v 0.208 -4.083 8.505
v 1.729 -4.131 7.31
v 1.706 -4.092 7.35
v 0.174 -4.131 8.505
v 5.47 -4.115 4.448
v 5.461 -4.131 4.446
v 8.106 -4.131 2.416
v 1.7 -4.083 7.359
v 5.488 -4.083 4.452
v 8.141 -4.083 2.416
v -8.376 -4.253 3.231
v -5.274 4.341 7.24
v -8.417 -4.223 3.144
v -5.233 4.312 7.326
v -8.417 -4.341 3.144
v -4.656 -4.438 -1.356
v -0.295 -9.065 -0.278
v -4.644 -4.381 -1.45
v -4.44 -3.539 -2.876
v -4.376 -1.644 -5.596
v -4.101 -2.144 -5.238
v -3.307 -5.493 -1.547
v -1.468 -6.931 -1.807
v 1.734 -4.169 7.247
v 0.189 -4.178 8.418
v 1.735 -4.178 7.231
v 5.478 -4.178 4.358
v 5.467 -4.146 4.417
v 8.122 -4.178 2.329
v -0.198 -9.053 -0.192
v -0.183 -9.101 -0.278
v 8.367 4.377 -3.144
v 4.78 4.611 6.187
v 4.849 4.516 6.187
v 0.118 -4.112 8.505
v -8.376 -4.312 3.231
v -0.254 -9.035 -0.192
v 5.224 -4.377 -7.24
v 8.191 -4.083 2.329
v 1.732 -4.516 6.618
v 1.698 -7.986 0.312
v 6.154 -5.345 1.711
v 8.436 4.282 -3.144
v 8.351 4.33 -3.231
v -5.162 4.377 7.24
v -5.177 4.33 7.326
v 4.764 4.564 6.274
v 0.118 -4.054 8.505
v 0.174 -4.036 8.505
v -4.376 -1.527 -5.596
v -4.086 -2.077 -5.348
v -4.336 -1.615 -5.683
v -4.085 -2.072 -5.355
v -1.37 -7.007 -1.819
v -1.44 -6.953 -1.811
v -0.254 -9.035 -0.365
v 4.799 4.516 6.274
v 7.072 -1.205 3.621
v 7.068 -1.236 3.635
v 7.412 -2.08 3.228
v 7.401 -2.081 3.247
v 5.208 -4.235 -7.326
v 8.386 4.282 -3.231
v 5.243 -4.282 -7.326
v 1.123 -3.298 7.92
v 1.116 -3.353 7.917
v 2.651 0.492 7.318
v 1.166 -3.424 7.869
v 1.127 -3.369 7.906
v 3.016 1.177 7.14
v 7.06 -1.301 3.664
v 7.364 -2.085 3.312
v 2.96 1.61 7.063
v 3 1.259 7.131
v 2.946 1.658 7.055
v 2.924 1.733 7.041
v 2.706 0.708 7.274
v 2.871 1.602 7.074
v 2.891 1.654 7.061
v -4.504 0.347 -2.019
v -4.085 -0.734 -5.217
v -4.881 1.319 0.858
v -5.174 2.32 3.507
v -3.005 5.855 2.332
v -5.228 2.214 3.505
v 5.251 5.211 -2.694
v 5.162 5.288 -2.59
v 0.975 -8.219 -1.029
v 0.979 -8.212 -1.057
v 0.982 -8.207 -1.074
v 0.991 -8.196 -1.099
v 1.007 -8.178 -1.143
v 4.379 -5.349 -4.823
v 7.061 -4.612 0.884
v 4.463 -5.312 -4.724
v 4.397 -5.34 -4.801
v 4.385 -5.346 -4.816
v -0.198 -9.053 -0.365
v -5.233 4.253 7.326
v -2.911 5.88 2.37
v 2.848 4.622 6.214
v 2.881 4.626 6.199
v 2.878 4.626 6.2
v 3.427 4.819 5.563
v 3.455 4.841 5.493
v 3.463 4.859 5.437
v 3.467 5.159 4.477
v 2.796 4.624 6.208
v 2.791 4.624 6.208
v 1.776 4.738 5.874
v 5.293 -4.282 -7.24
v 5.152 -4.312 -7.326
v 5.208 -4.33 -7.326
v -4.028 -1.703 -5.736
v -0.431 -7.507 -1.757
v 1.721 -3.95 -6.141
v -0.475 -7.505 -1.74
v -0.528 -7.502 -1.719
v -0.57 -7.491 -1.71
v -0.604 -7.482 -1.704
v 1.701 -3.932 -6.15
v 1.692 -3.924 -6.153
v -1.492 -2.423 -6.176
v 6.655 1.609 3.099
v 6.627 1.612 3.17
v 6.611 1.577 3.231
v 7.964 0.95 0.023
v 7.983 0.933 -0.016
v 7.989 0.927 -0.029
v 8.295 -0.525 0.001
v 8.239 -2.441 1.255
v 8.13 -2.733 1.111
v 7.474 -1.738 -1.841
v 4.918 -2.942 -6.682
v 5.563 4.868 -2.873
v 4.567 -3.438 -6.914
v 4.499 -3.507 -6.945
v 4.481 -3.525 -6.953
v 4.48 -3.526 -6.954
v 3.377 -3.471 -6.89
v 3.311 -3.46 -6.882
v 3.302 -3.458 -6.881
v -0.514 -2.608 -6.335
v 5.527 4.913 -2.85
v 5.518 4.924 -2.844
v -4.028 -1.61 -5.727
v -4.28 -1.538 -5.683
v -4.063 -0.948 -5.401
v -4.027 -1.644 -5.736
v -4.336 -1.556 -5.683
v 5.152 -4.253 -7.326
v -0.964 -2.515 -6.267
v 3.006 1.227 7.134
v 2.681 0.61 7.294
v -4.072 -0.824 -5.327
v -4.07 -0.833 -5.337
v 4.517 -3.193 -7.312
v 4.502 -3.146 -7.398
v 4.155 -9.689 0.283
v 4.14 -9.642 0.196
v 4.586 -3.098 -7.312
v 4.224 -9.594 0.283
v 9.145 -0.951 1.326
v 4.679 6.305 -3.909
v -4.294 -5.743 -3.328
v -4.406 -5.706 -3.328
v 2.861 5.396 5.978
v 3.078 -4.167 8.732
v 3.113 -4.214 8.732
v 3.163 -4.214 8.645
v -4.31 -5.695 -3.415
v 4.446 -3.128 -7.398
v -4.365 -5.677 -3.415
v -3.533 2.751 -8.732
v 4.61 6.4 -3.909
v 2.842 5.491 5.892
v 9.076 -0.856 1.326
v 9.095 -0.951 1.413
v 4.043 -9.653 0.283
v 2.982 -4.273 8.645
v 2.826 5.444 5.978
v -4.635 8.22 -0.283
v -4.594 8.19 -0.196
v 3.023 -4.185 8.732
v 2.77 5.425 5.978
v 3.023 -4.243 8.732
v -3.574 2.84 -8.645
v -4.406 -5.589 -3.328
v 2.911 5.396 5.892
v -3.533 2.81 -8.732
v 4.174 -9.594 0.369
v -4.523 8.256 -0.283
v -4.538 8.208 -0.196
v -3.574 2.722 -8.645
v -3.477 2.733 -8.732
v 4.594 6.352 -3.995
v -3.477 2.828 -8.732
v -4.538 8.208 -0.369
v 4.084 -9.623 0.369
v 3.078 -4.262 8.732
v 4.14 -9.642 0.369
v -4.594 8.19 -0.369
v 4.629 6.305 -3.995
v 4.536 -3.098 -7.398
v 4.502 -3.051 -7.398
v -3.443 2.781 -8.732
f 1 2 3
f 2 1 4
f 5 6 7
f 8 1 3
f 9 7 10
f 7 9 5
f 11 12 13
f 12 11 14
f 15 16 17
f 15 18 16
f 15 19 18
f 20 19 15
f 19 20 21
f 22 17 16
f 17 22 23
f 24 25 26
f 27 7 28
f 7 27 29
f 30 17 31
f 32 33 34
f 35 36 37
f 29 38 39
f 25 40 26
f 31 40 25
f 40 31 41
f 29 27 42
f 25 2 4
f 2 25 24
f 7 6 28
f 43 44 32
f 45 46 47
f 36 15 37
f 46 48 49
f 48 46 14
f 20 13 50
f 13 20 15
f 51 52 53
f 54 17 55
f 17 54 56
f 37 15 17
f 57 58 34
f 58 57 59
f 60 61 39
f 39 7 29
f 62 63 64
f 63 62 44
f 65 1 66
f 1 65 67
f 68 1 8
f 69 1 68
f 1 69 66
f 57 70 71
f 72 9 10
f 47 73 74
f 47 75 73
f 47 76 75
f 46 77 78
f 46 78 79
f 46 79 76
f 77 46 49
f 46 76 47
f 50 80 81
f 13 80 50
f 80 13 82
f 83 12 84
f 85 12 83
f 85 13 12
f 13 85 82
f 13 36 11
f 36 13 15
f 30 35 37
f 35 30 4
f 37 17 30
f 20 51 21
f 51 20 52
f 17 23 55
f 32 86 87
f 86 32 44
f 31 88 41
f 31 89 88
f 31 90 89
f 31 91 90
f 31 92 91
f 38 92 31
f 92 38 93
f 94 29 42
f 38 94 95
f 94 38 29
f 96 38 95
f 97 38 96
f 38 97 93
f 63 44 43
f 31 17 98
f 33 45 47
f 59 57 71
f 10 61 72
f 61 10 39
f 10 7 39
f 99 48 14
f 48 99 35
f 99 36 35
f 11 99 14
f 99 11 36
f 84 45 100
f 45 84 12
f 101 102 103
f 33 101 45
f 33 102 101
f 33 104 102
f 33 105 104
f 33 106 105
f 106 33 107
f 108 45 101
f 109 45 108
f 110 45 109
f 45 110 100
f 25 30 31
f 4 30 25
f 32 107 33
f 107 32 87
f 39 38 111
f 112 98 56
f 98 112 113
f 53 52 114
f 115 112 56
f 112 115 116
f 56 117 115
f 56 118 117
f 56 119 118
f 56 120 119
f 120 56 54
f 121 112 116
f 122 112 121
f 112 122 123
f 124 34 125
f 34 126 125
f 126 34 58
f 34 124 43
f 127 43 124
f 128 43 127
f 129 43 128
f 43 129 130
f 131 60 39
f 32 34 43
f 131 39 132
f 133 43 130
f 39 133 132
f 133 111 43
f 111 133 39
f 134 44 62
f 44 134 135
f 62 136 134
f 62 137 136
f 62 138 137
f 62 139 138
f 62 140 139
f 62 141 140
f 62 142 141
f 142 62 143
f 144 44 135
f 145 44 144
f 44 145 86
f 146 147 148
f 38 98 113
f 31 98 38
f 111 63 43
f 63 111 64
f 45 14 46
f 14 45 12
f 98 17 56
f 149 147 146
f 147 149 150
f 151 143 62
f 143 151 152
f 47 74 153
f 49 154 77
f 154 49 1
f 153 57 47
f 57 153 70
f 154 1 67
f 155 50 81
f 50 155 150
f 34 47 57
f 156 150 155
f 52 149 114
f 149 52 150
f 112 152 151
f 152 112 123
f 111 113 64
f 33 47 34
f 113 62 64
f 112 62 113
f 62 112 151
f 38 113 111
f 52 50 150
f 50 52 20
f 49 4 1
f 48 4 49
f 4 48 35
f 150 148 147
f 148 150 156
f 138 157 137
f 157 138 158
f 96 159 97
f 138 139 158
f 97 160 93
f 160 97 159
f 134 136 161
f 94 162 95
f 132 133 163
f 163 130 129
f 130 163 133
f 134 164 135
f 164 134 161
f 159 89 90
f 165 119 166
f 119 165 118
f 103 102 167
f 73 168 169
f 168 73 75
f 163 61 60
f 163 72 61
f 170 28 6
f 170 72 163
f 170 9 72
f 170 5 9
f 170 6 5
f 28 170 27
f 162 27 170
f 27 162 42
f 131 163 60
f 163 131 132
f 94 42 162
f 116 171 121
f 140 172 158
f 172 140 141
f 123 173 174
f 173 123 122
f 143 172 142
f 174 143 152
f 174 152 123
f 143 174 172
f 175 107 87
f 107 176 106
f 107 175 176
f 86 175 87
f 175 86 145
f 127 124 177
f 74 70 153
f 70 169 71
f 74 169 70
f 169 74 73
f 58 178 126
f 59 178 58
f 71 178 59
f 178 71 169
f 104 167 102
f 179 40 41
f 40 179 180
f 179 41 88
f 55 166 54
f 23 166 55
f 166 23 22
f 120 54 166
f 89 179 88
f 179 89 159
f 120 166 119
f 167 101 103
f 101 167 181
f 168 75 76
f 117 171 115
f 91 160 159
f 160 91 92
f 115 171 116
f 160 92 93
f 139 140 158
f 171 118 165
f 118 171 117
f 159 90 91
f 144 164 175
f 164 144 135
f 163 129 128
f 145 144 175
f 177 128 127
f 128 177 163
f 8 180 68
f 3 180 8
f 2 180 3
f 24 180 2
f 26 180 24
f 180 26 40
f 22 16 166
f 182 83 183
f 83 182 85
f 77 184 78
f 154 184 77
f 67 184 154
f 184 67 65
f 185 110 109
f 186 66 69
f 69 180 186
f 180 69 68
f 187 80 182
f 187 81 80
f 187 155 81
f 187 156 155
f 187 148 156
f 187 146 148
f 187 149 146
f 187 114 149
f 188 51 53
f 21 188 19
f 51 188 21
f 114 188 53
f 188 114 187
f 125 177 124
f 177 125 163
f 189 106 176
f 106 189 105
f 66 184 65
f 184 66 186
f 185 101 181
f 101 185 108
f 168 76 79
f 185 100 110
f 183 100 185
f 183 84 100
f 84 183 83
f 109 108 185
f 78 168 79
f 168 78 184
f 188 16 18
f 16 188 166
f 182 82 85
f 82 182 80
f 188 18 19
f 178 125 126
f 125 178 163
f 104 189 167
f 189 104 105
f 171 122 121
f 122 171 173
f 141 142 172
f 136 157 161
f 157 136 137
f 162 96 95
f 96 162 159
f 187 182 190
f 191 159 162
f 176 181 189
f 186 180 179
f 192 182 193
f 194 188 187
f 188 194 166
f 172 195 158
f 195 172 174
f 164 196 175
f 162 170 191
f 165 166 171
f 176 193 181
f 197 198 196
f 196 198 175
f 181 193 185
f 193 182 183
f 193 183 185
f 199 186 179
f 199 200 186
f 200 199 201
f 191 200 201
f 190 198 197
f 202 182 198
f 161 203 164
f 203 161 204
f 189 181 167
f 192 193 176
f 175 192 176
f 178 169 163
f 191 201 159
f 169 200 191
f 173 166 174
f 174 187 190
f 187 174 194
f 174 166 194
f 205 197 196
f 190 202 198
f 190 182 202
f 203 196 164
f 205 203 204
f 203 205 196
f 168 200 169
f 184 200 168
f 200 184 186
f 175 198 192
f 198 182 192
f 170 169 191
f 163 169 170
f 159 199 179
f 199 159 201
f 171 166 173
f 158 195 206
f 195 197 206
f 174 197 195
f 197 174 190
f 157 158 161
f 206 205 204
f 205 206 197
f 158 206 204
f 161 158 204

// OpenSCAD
// Auto-generated OpenSCAD file

    inner_points = 10*[[-0.4553770683985672, 0.816075390462194, -0.02826725120202972], [-0.3492651290097586, 0.27808264626453244, -0.8645112727111914], [0.3062996757811438, -0.4214091552352098, 0.8645112727111914], [0.4124116151699524, -0.9594018994328712, 0.02826725120202972], [0.45789115536956515, 0.630471121507822, -0.3908857929250278], [0.9045034915748815, -0.09513310390029023, 0.13259861870450954], [-0.5386073879474271, -0.026770981308893688, 0.5034118884114294], [-0.43249544855861854, -0.5647637255065552, -0.33283213309773235], [0.28106973038452526, 0.5396015179782265, 0.5891534403817997], [0.44860512332870417, -0.3098111524472321, -0.7311548260368412]];

    outer_points = 10*[[-0.8336003958246909, -0.4282242422434667, 0.3144481157395024], [-0.5192798779886039, 0.4282242422434667, 0.7239583176726031], [0.5192798779886039, -0.4282242422434667, -0.7239583176726031], [0.8336003958246909, 0.4282242422434667, -0.3144481157395024], [0.015816542021752034, -0.40830815643207485, 0.8417945059096876], [0.8090835339719289, -0.40830815643207485, 0.2329205620737586], [-0.42955329110383256, -0.15856661937867184, -0.559640382982223], [-0.11523277326774545, 0.6978818651082617, -0.15013018104912235], [-0.02137609852116739, -0.9005841684864844, -0.02784969457994478], [0.47489050229114943, 0.45162402044515604, 0.6187076390309791]];

    // Convex hull for inner set (I)
    module inner_hull() {
        hull() {
            for (p = inner_points) {
                translate(p) sphere(r=0.1);
            }
        }
    }

    // Convex hull for outer set (O) minus inner hull (O \ I)
    module outer_minus_inner() {
        difference() {
            hull() {
                for (p = outer_points) {
                    translate(p) sphere(r=0.1);
                }
            }
            inner_hull(); // Subtract inner hull
        }
    }

    // Convex hull for outer set (O) minus all translated inner hulls
    module outer_minus_AllTranslationInner() {
        difference() {
            hull() {
                for (p = outer_points) {
                    translate(p) sphere(r=0.1);
                }
            }
            hull() {
                translate([0,0,50]) inner_hull();
                translate([0,0,-50]) inner_hull();
            }; // Subtract translated inner hulls
        }
    }

    // Difference between outer_minus_inner and outer_minus_AllTranslationInner
    module outer_minus_inner_diff() {
        difference() {
            // Outer minus inner
            difference() {
                hull() {
                    for (p = outer_points) {
                        translate(p) sphere(r=0.1);
                    }
                }
                inner_hull();
            }

            // Subtract Outer minus AllTranslationInner
            difference() {
                hull() {
                    for (p = outer_points) {
                        translate(p) sphere(r=0.1);
                    }
                }
                hull() {
                    translate([0,0,50]) inner_hull();
                    translate([0,0,-50]) inner_hull();
                };
            }
        }
    }

    // Rendering all with colors applied
    color([1, 0, 0, 0.5]) inner_hull(); // Transparent red
    color([0, 1, 0, 1]) outer_minus_AllTranslationInner(); // Opaque green
    color([1, 1, 0, 1]) outer_minus_inner_diff(); // Opaque yellow
    
